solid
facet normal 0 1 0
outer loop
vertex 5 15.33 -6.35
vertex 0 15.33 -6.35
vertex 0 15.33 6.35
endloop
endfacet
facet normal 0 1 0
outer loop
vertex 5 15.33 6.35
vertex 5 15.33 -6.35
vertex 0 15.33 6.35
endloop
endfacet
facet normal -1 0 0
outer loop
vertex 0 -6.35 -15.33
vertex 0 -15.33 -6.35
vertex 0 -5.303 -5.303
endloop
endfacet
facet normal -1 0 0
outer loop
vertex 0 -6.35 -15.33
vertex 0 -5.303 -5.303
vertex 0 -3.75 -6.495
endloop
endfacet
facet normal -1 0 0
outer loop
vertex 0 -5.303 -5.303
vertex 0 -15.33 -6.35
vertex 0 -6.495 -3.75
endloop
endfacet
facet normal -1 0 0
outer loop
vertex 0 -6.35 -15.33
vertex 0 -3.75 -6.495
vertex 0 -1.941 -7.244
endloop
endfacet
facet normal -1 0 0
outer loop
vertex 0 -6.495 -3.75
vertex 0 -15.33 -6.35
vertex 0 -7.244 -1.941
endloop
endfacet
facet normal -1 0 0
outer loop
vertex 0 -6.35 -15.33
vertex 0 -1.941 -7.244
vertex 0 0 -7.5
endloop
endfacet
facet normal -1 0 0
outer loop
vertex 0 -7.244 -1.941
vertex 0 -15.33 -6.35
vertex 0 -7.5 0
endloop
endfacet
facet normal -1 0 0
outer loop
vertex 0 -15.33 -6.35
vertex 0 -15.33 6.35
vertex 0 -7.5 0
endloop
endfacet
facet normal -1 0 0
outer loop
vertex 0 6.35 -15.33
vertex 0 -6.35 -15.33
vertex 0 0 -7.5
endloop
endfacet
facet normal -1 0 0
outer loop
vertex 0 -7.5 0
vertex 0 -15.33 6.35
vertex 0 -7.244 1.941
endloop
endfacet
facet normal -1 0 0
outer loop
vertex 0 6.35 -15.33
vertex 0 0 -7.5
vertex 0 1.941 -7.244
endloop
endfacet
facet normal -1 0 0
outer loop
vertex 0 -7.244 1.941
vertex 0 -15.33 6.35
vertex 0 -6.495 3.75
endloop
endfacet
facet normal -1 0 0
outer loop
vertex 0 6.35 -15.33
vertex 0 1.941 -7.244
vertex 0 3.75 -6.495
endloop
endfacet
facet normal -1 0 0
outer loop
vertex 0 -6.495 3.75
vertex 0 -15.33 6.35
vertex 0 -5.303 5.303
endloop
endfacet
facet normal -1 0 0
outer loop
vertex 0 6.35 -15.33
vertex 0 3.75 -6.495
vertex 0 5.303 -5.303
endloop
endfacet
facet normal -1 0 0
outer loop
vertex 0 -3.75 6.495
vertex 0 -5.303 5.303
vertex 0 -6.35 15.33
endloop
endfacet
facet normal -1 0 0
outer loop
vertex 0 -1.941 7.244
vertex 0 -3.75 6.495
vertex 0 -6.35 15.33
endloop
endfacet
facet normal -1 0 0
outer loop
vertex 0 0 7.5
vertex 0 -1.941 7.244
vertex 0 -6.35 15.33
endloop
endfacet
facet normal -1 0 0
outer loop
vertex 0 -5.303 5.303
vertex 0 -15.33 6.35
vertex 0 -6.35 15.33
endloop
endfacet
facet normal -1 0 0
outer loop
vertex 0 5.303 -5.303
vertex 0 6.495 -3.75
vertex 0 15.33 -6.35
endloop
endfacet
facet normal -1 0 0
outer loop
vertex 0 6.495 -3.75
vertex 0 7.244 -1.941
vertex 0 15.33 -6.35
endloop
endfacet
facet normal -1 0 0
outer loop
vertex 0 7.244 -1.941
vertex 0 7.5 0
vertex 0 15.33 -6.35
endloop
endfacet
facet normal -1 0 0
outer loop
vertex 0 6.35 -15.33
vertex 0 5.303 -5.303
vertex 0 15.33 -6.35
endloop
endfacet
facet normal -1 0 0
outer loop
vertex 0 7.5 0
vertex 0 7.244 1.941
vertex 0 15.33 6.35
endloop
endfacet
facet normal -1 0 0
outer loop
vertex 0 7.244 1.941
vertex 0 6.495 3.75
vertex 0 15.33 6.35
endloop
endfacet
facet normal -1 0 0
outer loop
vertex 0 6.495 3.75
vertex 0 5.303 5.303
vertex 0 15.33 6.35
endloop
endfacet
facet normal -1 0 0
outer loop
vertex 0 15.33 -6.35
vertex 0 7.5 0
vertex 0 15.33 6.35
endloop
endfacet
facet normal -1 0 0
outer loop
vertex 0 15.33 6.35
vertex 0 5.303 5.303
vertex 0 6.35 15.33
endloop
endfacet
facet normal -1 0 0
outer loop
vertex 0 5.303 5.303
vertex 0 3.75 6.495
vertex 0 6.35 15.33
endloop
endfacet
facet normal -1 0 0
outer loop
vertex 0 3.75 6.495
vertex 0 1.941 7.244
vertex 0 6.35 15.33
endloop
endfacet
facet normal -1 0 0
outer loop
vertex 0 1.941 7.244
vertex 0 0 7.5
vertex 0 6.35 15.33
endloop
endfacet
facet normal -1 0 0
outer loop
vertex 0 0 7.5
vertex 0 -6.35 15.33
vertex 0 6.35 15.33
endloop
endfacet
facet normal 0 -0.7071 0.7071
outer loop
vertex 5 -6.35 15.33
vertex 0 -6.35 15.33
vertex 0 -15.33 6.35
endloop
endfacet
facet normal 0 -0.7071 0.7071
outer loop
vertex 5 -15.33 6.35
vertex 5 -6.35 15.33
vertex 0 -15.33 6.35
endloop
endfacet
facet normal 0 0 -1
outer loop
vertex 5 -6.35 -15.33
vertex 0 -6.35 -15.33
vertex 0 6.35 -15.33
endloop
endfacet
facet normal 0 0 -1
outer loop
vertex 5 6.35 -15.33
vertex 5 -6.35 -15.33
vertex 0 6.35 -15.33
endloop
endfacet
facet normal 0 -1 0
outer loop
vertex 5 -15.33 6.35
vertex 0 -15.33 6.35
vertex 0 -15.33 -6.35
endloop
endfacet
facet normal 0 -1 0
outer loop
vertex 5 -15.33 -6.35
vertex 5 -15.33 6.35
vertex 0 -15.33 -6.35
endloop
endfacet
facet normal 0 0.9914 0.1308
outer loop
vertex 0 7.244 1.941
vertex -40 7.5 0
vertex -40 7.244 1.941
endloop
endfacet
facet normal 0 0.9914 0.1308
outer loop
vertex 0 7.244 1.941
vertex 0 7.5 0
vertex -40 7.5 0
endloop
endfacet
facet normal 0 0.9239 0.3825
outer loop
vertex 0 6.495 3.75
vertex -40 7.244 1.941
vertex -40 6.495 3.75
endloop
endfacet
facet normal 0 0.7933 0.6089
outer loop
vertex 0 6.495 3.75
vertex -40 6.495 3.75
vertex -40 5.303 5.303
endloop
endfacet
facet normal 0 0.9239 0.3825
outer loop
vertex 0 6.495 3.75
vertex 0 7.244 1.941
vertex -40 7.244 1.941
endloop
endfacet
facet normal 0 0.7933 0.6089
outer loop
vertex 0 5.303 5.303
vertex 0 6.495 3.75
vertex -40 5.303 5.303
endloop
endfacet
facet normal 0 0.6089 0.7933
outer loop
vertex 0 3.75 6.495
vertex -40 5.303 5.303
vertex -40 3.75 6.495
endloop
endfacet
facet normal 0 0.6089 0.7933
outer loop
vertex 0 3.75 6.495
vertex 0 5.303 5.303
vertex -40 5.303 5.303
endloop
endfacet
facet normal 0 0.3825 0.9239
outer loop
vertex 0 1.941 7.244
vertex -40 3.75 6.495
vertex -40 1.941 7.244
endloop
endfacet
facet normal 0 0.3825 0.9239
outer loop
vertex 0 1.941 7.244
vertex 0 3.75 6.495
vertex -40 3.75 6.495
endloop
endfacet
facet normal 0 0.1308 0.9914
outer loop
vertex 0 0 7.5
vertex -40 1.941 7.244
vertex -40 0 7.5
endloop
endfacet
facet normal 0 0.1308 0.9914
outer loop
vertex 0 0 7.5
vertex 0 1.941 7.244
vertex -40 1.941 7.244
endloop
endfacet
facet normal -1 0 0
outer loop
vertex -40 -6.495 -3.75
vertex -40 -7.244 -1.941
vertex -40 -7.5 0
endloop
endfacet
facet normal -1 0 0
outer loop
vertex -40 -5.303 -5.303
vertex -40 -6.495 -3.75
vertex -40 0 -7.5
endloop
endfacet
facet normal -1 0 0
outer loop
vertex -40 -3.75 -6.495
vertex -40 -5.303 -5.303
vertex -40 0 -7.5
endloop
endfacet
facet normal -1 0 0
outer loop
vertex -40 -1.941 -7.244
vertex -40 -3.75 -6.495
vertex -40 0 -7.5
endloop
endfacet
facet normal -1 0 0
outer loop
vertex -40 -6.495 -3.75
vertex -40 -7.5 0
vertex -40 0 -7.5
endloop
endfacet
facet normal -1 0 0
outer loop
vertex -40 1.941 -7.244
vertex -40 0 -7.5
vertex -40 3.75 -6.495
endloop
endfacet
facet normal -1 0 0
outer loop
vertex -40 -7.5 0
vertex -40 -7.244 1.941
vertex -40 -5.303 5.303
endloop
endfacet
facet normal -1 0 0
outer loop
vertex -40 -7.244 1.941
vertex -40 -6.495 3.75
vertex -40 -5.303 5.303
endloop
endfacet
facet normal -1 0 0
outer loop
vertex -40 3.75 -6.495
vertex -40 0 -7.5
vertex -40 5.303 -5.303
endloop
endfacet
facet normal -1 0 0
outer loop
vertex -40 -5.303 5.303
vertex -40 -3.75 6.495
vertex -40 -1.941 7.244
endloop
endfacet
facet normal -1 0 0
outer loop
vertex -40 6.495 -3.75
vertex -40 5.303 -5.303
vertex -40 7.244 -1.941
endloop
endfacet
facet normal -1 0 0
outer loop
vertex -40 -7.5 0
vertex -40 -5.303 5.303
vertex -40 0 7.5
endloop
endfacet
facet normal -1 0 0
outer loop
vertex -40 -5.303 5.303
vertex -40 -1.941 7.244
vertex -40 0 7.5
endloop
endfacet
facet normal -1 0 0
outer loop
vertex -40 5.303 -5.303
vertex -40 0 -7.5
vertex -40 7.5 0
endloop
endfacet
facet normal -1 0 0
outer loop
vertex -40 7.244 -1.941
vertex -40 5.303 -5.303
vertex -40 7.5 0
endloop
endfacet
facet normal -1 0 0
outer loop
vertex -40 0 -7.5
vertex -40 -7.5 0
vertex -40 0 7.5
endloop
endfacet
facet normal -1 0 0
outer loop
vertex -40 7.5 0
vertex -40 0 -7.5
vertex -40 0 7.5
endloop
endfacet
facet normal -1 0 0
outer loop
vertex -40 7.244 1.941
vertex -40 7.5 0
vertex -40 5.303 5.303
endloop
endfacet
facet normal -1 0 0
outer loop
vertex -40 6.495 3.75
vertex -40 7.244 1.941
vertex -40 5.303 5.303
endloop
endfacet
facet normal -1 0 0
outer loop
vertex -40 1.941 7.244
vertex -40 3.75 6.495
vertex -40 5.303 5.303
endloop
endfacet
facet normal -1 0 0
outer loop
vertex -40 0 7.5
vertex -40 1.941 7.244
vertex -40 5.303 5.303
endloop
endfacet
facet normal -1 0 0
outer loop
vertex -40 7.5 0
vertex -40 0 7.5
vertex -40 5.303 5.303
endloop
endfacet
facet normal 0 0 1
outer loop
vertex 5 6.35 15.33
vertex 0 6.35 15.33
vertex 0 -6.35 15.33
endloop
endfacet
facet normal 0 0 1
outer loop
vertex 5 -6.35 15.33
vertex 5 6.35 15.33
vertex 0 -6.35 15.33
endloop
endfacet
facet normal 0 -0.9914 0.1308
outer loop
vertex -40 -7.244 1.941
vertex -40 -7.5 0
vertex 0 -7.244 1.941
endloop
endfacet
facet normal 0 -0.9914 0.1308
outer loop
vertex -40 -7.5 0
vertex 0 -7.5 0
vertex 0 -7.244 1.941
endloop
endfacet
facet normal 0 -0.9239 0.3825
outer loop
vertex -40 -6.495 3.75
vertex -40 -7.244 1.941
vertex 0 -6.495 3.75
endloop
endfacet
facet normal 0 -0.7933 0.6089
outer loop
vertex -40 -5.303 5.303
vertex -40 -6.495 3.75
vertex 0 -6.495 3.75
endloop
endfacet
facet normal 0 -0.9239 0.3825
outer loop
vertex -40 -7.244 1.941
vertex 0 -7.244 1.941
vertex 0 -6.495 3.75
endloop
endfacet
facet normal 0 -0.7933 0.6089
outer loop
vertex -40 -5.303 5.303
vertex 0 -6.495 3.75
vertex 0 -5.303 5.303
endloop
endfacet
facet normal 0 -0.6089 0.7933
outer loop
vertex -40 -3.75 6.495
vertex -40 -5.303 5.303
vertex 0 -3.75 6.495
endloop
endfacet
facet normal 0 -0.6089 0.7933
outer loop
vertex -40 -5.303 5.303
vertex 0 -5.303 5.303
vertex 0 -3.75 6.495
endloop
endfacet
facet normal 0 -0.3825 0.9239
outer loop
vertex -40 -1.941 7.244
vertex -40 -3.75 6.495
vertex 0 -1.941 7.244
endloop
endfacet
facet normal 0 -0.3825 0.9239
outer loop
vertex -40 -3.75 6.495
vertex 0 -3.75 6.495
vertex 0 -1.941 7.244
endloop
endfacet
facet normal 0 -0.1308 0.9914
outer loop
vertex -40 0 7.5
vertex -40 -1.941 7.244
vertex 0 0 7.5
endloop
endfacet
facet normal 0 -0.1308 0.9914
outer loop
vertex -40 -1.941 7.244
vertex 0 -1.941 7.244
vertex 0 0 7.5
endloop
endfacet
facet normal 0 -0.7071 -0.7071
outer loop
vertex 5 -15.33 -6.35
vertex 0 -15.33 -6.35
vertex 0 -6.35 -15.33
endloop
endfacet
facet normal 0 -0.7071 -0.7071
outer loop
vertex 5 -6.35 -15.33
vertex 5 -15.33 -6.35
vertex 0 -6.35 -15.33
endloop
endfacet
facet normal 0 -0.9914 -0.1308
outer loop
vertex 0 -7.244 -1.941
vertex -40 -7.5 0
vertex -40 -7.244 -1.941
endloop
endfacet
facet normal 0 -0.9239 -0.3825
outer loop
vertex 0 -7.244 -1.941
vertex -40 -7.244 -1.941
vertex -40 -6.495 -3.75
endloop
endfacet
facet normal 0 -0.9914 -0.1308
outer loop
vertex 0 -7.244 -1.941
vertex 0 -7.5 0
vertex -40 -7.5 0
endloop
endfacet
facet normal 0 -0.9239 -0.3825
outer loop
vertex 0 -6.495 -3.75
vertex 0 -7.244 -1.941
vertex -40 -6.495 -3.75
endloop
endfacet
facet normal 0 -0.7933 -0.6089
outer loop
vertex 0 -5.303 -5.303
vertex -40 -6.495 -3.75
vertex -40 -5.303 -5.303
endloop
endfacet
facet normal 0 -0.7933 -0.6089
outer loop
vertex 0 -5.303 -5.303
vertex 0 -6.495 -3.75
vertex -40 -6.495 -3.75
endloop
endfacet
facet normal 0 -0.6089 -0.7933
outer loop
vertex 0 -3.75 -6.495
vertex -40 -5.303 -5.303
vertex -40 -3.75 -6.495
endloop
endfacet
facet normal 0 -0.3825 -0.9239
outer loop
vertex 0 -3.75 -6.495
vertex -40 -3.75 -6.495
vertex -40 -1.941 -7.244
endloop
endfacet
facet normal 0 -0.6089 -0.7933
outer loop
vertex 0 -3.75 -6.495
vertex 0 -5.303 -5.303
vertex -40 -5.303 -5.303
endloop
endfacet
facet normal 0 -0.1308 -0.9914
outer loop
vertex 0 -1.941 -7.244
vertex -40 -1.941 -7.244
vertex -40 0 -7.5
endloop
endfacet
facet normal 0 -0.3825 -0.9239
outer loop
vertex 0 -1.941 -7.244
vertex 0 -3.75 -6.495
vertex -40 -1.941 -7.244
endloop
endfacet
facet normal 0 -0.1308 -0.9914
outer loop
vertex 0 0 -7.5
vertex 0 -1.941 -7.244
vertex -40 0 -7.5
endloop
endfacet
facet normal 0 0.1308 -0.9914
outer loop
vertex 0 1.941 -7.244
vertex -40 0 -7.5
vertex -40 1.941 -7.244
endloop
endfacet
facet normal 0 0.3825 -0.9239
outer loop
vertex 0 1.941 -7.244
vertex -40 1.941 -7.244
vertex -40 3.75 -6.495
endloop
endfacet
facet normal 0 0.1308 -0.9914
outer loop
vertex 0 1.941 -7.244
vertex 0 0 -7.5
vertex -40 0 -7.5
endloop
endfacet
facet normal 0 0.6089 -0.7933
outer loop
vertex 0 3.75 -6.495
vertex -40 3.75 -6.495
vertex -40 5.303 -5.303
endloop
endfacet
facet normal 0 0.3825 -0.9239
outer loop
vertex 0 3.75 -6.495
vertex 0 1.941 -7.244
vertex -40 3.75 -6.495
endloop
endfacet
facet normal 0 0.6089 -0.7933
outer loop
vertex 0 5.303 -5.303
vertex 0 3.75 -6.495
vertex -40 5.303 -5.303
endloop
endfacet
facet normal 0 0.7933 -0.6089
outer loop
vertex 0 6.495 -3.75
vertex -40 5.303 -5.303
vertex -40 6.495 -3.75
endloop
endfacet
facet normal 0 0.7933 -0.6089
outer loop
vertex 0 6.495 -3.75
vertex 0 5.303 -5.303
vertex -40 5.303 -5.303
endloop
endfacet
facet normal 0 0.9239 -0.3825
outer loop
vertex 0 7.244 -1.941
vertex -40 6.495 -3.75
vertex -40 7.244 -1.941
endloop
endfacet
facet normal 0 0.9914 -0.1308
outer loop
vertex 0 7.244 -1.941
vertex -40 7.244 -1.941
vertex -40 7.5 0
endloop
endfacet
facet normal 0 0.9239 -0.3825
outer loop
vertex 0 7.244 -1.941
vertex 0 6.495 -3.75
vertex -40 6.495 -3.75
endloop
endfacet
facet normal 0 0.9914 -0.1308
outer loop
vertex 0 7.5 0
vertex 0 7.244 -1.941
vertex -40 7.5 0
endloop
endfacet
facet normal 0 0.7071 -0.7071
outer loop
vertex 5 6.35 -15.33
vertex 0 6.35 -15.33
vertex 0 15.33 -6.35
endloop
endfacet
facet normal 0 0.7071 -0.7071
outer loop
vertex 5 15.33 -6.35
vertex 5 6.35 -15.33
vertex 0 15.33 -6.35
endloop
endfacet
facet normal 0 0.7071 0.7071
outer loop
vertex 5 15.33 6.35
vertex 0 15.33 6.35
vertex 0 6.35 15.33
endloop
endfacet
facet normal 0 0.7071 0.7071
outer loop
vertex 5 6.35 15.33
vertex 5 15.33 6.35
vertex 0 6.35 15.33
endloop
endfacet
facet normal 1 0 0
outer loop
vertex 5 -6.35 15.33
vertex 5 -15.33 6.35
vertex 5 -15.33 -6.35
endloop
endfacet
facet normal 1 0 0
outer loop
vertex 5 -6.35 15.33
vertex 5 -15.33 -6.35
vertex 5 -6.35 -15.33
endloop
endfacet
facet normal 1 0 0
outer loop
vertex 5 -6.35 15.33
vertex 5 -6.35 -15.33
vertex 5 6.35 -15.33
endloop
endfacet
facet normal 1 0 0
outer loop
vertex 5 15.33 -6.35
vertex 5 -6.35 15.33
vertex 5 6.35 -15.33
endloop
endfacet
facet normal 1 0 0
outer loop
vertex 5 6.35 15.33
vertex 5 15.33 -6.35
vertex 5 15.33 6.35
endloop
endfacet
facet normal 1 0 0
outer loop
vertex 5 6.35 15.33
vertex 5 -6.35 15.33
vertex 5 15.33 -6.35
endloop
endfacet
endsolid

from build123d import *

# Parameters (mm, degrees)
F2_DEPTH = 5
F1_W     = 40
F1_H     = 15
F3_DEPTH = 7.5
F4_R     = 7.49999


# Not quite as in the source:
# - a fillet or chamfer is up to 0.001 mm smaller than in the source, because OpenCascade refuses the exact size


with BuildPart() as f2:
    # F0 (on Right) → F2 (new body)
    with BuildSketch(Plane.YZ):
        Polygon((15.3302561211, -6.35), (15.3302561211, 6.35), (6.35, 15.3302561211), (-6.35, 15.3302561211), (-15.3302561211, 6.35), (-15.3302561211, -6.35), (-6.35, -15.3302561211), (6.35, -15.3302561211), align=None)
    extrude(amount=F2_DEPTH)

    # F1 (on Top) → F3 (join, symmetric)
    with BuildSketch(Plane.XY):
        with Locations((-20, 0)):
            Rectangle(F1_W, F1_H)
    extrude(amount=F3_DEPTH, both=True)

    # F4 (radius 7.5 in the source; OpenCascade refuses exactly that, so slightly less here)
    f4_edges = [f2.edges().sort_by_distance(p)[0] for p in [
        (-20, 7.5, 7.5),
        (-20, 7.5, -7.5),
        (-20, -7.5, -7.5),
        (-20, -7.5, 7.5),
    ]]
    fillet(f4_edges, radius=F4_R)


solid = f2.part
